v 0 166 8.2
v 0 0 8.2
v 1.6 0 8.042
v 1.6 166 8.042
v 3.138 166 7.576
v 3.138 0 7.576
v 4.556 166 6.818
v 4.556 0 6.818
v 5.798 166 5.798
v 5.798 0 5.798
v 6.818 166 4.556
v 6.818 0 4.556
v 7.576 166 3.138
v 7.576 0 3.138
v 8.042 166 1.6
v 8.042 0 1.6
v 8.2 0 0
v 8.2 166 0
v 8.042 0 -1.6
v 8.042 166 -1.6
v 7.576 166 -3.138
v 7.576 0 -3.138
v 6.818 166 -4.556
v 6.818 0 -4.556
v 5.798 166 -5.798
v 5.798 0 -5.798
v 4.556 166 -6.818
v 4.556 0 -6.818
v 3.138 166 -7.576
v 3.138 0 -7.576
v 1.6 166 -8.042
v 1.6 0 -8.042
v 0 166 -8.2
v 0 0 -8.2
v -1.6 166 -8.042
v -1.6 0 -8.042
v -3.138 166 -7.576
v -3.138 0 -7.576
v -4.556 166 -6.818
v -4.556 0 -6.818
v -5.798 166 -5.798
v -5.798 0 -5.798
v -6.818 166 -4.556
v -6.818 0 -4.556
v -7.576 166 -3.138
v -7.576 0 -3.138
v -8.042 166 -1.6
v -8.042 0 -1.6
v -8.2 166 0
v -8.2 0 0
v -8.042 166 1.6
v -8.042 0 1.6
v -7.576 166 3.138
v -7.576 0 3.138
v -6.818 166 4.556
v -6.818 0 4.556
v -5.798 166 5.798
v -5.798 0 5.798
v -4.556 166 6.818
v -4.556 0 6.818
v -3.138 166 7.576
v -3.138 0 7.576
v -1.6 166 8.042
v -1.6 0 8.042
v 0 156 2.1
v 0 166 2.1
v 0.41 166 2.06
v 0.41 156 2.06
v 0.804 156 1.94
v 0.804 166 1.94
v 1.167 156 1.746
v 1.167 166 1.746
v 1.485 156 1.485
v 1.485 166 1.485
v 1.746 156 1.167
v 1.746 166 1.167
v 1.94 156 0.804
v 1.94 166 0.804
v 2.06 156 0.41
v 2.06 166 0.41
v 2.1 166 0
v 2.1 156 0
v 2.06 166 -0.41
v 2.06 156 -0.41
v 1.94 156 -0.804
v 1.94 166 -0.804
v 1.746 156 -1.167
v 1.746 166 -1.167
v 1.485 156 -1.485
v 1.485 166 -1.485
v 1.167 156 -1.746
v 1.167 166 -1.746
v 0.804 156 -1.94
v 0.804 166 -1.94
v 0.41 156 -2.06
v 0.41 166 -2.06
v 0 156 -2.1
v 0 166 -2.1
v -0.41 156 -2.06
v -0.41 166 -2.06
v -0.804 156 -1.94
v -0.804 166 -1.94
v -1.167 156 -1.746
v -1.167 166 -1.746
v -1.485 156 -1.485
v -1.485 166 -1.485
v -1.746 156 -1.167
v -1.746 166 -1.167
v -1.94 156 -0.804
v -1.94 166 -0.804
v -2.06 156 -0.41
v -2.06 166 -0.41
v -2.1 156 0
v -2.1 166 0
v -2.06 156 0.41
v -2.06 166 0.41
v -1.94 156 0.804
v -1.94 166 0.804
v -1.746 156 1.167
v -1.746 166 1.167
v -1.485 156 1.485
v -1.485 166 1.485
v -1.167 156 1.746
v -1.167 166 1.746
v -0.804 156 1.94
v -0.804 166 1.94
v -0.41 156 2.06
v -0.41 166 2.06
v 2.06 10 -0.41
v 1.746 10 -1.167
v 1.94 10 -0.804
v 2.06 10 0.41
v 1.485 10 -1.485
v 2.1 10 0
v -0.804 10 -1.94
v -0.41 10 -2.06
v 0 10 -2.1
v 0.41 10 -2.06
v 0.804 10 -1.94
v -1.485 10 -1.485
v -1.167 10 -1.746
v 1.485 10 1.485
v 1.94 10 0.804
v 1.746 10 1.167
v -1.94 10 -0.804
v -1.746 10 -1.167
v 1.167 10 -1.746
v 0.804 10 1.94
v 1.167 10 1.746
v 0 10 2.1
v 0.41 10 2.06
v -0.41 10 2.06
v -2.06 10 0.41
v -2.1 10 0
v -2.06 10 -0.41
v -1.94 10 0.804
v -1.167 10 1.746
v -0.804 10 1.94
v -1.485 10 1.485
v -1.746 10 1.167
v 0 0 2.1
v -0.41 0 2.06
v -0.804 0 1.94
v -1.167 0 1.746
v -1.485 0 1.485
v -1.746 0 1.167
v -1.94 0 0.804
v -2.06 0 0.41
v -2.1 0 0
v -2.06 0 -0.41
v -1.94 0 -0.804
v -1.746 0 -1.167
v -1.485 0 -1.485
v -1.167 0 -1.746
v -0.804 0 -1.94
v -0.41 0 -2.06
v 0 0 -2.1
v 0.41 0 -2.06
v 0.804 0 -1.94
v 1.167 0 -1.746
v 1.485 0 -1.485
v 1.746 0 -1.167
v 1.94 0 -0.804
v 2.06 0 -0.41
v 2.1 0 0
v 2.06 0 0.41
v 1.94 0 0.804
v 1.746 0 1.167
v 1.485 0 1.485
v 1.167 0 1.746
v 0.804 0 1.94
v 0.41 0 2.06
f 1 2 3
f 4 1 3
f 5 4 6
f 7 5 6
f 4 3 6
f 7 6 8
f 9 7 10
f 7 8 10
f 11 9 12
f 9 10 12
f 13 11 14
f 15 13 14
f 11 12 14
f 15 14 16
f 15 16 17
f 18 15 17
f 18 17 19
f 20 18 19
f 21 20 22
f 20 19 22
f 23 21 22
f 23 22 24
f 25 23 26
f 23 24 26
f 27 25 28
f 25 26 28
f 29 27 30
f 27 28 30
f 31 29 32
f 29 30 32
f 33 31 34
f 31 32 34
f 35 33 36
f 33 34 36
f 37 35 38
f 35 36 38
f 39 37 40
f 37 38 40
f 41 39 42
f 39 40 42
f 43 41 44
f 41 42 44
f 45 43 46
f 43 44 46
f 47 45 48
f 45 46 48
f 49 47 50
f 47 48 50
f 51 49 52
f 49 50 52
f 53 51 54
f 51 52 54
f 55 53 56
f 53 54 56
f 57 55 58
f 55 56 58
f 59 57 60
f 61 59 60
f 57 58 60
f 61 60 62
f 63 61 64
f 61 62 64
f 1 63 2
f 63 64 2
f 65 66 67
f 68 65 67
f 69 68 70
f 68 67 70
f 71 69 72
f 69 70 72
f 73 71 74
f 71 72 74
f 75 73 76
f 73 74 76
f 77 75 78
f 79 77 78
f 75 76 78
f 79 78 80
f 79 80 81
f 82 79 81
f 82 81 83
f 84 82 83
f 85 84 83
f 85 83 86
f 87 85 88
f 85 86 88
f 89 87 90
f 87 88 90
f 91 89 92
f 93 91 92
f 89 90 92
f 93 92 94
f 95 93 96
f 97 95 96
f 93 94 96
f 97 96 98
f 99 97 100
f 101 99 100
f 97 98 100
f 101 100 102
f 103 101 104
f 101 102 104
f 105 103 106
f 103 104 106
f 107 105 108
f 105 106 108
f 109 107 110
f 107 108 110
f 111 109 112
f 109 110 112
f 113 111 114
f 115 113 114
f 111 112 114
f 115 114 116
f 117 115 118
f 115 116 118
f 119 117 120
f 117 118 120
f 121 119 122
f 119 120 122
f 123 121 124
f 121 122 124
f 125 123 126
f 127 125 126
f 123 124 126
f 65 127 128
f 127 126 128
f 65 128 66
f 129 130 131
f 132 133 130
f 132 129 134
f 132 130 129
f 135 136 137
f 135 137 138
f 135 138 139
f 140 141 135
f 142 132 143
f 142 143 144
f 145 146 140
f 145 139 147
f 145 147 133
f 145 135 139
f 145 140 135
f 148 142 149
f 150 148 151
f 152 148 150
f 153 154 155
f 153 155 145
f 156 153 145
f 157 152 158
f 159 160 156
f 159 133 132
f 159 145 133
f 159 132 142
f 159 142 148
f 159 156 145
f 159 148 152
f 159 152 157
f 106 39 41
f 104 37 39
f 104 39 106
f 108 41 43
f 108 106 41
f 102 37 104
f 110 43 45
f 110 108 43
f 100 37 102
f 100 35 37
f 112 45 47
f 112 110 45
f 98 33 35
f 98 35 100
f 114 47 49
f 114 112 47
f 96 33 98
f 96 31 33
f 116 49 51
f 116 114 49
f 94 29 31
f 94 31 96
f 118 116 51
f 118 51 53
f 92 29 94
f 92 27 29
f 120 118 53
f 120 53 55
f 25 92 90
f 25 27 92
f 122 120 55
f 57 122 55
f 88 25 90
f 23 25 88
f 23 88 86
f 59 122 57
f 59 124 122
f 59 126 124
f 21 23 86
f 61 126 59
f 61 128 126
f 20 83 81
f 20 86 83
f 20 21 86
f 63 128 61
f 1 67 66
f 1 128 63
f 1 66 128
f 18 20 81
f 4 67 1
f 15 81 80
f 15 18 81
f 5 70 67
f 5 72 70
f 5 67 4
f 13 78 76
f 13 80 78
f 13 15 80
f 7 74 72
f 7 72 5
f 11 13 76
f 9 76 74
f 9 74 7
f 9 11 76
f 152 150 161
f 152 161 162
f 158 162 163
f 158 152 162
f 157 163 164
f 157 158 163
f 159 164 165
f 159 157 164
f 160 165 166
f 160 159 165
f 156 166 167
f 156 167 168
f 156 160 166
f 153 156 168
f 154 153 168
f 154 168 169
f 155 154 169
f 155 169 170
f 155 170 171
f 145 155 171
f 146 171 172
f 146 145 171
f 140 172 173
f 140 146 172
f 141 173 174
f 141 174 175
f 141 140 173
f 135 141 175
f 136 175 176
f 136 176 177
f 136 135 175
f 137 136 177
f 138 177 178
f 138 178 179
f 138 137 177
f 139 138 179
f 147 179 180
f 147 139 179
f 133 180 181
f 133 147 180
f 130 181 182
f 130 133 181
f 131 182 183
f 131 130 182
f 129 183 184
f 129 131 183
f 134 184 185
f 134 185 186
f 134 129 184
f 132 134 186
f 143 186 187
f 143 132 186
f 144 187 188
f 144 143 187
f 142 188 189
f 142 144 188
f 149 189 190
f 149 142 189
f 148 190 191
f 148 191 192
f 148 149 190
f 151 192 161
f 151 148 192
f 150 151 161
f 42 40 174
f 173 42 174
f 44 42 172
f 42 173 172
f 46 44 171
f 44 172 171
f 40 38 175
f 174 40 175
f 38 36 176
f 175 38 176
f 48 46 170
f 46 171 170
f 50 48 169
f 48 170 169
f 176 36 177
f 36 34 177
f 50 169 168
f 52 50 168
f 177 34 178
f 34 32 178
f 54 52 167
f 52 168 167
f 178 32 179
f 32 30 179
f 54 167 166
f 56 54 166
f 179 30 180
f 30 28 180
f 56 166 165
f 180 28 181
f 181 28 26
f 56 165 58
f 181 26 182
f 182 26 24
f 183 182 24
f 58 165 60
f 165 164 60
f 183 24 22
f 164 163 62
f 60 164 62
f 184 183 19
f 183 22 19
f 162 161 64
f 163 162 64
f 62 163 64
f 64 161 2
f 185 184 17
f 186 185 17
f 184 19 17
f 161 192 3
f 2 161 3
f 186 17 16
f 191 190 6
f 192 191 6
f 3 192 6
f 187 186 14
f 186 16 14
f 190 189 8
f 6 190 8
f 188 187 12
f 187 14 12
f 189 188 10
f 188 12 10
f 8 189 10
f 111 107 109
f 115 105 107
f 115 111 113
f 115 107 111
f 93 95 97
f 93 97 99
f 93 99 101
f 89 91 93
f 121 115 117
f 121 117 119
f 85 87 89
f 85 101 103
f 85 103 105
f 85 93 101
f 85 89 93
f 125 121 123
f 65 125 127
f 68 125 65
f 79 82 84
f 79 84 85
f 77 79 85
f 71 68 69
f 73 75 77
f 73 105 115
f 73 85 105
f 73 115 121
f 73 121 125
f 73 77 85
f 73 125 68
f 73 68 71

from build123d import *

# Parameters (mm, degrees)
SKETCH2_R           = 8.2
BOSS_EXTRUDE1_DEPTH = 166
SKETCH3_R           = 2.1
CUT_EXTRUDE1_DEPTH  = 10
CUT_EXTRUDE2_START  = -10
SKETCH4_R           = 2.1
CUT_EXTRUDE2_DEPTH  = 10


with BuildPart() as part:
    # Sketch2 → Boss-Extrude1 (new body)
    with BuildSketch(Plane(origin=(0, 0, 0), x_dir=(1, 0, 0), z_dir=(0, 1, 0))):
        with Locations(Location((0, 0, 0), (0, 0, 270))):
            Circle(SKETCH2_R)
    extrude(amount=BOSS_EXTRUDE1_DEPTH)

    # Sketch3 → Cut-Extrude1 (cut)
    with BuildSketch(Plane(origin=(0, 166, 0), x_dir=(1, 0, 0), z_dir=(0, 1, 0))):
        with Locations(Location((0, 0, 0), (0, 0, 270))):
            Circle(SKETCH3_R)
    extrude(amount=-CUT_EXTRUDE1_DEPTH, mode=Mode.SUBTRACT)

    # Sketch4 → Cut-Extrude2 (cut)
    with BuildSketch(Plane.XZ.offset(CUT_EXTRUDE2_START)):
        with Locations(Location((0, 0, 0), (0, 0, 90))):
            Circle(SKETCH4_R)
    extrude(amount=CUT_EXTRUDE2_DEPTH, mode=Mode.SUBTRACT)


solid = part.part
